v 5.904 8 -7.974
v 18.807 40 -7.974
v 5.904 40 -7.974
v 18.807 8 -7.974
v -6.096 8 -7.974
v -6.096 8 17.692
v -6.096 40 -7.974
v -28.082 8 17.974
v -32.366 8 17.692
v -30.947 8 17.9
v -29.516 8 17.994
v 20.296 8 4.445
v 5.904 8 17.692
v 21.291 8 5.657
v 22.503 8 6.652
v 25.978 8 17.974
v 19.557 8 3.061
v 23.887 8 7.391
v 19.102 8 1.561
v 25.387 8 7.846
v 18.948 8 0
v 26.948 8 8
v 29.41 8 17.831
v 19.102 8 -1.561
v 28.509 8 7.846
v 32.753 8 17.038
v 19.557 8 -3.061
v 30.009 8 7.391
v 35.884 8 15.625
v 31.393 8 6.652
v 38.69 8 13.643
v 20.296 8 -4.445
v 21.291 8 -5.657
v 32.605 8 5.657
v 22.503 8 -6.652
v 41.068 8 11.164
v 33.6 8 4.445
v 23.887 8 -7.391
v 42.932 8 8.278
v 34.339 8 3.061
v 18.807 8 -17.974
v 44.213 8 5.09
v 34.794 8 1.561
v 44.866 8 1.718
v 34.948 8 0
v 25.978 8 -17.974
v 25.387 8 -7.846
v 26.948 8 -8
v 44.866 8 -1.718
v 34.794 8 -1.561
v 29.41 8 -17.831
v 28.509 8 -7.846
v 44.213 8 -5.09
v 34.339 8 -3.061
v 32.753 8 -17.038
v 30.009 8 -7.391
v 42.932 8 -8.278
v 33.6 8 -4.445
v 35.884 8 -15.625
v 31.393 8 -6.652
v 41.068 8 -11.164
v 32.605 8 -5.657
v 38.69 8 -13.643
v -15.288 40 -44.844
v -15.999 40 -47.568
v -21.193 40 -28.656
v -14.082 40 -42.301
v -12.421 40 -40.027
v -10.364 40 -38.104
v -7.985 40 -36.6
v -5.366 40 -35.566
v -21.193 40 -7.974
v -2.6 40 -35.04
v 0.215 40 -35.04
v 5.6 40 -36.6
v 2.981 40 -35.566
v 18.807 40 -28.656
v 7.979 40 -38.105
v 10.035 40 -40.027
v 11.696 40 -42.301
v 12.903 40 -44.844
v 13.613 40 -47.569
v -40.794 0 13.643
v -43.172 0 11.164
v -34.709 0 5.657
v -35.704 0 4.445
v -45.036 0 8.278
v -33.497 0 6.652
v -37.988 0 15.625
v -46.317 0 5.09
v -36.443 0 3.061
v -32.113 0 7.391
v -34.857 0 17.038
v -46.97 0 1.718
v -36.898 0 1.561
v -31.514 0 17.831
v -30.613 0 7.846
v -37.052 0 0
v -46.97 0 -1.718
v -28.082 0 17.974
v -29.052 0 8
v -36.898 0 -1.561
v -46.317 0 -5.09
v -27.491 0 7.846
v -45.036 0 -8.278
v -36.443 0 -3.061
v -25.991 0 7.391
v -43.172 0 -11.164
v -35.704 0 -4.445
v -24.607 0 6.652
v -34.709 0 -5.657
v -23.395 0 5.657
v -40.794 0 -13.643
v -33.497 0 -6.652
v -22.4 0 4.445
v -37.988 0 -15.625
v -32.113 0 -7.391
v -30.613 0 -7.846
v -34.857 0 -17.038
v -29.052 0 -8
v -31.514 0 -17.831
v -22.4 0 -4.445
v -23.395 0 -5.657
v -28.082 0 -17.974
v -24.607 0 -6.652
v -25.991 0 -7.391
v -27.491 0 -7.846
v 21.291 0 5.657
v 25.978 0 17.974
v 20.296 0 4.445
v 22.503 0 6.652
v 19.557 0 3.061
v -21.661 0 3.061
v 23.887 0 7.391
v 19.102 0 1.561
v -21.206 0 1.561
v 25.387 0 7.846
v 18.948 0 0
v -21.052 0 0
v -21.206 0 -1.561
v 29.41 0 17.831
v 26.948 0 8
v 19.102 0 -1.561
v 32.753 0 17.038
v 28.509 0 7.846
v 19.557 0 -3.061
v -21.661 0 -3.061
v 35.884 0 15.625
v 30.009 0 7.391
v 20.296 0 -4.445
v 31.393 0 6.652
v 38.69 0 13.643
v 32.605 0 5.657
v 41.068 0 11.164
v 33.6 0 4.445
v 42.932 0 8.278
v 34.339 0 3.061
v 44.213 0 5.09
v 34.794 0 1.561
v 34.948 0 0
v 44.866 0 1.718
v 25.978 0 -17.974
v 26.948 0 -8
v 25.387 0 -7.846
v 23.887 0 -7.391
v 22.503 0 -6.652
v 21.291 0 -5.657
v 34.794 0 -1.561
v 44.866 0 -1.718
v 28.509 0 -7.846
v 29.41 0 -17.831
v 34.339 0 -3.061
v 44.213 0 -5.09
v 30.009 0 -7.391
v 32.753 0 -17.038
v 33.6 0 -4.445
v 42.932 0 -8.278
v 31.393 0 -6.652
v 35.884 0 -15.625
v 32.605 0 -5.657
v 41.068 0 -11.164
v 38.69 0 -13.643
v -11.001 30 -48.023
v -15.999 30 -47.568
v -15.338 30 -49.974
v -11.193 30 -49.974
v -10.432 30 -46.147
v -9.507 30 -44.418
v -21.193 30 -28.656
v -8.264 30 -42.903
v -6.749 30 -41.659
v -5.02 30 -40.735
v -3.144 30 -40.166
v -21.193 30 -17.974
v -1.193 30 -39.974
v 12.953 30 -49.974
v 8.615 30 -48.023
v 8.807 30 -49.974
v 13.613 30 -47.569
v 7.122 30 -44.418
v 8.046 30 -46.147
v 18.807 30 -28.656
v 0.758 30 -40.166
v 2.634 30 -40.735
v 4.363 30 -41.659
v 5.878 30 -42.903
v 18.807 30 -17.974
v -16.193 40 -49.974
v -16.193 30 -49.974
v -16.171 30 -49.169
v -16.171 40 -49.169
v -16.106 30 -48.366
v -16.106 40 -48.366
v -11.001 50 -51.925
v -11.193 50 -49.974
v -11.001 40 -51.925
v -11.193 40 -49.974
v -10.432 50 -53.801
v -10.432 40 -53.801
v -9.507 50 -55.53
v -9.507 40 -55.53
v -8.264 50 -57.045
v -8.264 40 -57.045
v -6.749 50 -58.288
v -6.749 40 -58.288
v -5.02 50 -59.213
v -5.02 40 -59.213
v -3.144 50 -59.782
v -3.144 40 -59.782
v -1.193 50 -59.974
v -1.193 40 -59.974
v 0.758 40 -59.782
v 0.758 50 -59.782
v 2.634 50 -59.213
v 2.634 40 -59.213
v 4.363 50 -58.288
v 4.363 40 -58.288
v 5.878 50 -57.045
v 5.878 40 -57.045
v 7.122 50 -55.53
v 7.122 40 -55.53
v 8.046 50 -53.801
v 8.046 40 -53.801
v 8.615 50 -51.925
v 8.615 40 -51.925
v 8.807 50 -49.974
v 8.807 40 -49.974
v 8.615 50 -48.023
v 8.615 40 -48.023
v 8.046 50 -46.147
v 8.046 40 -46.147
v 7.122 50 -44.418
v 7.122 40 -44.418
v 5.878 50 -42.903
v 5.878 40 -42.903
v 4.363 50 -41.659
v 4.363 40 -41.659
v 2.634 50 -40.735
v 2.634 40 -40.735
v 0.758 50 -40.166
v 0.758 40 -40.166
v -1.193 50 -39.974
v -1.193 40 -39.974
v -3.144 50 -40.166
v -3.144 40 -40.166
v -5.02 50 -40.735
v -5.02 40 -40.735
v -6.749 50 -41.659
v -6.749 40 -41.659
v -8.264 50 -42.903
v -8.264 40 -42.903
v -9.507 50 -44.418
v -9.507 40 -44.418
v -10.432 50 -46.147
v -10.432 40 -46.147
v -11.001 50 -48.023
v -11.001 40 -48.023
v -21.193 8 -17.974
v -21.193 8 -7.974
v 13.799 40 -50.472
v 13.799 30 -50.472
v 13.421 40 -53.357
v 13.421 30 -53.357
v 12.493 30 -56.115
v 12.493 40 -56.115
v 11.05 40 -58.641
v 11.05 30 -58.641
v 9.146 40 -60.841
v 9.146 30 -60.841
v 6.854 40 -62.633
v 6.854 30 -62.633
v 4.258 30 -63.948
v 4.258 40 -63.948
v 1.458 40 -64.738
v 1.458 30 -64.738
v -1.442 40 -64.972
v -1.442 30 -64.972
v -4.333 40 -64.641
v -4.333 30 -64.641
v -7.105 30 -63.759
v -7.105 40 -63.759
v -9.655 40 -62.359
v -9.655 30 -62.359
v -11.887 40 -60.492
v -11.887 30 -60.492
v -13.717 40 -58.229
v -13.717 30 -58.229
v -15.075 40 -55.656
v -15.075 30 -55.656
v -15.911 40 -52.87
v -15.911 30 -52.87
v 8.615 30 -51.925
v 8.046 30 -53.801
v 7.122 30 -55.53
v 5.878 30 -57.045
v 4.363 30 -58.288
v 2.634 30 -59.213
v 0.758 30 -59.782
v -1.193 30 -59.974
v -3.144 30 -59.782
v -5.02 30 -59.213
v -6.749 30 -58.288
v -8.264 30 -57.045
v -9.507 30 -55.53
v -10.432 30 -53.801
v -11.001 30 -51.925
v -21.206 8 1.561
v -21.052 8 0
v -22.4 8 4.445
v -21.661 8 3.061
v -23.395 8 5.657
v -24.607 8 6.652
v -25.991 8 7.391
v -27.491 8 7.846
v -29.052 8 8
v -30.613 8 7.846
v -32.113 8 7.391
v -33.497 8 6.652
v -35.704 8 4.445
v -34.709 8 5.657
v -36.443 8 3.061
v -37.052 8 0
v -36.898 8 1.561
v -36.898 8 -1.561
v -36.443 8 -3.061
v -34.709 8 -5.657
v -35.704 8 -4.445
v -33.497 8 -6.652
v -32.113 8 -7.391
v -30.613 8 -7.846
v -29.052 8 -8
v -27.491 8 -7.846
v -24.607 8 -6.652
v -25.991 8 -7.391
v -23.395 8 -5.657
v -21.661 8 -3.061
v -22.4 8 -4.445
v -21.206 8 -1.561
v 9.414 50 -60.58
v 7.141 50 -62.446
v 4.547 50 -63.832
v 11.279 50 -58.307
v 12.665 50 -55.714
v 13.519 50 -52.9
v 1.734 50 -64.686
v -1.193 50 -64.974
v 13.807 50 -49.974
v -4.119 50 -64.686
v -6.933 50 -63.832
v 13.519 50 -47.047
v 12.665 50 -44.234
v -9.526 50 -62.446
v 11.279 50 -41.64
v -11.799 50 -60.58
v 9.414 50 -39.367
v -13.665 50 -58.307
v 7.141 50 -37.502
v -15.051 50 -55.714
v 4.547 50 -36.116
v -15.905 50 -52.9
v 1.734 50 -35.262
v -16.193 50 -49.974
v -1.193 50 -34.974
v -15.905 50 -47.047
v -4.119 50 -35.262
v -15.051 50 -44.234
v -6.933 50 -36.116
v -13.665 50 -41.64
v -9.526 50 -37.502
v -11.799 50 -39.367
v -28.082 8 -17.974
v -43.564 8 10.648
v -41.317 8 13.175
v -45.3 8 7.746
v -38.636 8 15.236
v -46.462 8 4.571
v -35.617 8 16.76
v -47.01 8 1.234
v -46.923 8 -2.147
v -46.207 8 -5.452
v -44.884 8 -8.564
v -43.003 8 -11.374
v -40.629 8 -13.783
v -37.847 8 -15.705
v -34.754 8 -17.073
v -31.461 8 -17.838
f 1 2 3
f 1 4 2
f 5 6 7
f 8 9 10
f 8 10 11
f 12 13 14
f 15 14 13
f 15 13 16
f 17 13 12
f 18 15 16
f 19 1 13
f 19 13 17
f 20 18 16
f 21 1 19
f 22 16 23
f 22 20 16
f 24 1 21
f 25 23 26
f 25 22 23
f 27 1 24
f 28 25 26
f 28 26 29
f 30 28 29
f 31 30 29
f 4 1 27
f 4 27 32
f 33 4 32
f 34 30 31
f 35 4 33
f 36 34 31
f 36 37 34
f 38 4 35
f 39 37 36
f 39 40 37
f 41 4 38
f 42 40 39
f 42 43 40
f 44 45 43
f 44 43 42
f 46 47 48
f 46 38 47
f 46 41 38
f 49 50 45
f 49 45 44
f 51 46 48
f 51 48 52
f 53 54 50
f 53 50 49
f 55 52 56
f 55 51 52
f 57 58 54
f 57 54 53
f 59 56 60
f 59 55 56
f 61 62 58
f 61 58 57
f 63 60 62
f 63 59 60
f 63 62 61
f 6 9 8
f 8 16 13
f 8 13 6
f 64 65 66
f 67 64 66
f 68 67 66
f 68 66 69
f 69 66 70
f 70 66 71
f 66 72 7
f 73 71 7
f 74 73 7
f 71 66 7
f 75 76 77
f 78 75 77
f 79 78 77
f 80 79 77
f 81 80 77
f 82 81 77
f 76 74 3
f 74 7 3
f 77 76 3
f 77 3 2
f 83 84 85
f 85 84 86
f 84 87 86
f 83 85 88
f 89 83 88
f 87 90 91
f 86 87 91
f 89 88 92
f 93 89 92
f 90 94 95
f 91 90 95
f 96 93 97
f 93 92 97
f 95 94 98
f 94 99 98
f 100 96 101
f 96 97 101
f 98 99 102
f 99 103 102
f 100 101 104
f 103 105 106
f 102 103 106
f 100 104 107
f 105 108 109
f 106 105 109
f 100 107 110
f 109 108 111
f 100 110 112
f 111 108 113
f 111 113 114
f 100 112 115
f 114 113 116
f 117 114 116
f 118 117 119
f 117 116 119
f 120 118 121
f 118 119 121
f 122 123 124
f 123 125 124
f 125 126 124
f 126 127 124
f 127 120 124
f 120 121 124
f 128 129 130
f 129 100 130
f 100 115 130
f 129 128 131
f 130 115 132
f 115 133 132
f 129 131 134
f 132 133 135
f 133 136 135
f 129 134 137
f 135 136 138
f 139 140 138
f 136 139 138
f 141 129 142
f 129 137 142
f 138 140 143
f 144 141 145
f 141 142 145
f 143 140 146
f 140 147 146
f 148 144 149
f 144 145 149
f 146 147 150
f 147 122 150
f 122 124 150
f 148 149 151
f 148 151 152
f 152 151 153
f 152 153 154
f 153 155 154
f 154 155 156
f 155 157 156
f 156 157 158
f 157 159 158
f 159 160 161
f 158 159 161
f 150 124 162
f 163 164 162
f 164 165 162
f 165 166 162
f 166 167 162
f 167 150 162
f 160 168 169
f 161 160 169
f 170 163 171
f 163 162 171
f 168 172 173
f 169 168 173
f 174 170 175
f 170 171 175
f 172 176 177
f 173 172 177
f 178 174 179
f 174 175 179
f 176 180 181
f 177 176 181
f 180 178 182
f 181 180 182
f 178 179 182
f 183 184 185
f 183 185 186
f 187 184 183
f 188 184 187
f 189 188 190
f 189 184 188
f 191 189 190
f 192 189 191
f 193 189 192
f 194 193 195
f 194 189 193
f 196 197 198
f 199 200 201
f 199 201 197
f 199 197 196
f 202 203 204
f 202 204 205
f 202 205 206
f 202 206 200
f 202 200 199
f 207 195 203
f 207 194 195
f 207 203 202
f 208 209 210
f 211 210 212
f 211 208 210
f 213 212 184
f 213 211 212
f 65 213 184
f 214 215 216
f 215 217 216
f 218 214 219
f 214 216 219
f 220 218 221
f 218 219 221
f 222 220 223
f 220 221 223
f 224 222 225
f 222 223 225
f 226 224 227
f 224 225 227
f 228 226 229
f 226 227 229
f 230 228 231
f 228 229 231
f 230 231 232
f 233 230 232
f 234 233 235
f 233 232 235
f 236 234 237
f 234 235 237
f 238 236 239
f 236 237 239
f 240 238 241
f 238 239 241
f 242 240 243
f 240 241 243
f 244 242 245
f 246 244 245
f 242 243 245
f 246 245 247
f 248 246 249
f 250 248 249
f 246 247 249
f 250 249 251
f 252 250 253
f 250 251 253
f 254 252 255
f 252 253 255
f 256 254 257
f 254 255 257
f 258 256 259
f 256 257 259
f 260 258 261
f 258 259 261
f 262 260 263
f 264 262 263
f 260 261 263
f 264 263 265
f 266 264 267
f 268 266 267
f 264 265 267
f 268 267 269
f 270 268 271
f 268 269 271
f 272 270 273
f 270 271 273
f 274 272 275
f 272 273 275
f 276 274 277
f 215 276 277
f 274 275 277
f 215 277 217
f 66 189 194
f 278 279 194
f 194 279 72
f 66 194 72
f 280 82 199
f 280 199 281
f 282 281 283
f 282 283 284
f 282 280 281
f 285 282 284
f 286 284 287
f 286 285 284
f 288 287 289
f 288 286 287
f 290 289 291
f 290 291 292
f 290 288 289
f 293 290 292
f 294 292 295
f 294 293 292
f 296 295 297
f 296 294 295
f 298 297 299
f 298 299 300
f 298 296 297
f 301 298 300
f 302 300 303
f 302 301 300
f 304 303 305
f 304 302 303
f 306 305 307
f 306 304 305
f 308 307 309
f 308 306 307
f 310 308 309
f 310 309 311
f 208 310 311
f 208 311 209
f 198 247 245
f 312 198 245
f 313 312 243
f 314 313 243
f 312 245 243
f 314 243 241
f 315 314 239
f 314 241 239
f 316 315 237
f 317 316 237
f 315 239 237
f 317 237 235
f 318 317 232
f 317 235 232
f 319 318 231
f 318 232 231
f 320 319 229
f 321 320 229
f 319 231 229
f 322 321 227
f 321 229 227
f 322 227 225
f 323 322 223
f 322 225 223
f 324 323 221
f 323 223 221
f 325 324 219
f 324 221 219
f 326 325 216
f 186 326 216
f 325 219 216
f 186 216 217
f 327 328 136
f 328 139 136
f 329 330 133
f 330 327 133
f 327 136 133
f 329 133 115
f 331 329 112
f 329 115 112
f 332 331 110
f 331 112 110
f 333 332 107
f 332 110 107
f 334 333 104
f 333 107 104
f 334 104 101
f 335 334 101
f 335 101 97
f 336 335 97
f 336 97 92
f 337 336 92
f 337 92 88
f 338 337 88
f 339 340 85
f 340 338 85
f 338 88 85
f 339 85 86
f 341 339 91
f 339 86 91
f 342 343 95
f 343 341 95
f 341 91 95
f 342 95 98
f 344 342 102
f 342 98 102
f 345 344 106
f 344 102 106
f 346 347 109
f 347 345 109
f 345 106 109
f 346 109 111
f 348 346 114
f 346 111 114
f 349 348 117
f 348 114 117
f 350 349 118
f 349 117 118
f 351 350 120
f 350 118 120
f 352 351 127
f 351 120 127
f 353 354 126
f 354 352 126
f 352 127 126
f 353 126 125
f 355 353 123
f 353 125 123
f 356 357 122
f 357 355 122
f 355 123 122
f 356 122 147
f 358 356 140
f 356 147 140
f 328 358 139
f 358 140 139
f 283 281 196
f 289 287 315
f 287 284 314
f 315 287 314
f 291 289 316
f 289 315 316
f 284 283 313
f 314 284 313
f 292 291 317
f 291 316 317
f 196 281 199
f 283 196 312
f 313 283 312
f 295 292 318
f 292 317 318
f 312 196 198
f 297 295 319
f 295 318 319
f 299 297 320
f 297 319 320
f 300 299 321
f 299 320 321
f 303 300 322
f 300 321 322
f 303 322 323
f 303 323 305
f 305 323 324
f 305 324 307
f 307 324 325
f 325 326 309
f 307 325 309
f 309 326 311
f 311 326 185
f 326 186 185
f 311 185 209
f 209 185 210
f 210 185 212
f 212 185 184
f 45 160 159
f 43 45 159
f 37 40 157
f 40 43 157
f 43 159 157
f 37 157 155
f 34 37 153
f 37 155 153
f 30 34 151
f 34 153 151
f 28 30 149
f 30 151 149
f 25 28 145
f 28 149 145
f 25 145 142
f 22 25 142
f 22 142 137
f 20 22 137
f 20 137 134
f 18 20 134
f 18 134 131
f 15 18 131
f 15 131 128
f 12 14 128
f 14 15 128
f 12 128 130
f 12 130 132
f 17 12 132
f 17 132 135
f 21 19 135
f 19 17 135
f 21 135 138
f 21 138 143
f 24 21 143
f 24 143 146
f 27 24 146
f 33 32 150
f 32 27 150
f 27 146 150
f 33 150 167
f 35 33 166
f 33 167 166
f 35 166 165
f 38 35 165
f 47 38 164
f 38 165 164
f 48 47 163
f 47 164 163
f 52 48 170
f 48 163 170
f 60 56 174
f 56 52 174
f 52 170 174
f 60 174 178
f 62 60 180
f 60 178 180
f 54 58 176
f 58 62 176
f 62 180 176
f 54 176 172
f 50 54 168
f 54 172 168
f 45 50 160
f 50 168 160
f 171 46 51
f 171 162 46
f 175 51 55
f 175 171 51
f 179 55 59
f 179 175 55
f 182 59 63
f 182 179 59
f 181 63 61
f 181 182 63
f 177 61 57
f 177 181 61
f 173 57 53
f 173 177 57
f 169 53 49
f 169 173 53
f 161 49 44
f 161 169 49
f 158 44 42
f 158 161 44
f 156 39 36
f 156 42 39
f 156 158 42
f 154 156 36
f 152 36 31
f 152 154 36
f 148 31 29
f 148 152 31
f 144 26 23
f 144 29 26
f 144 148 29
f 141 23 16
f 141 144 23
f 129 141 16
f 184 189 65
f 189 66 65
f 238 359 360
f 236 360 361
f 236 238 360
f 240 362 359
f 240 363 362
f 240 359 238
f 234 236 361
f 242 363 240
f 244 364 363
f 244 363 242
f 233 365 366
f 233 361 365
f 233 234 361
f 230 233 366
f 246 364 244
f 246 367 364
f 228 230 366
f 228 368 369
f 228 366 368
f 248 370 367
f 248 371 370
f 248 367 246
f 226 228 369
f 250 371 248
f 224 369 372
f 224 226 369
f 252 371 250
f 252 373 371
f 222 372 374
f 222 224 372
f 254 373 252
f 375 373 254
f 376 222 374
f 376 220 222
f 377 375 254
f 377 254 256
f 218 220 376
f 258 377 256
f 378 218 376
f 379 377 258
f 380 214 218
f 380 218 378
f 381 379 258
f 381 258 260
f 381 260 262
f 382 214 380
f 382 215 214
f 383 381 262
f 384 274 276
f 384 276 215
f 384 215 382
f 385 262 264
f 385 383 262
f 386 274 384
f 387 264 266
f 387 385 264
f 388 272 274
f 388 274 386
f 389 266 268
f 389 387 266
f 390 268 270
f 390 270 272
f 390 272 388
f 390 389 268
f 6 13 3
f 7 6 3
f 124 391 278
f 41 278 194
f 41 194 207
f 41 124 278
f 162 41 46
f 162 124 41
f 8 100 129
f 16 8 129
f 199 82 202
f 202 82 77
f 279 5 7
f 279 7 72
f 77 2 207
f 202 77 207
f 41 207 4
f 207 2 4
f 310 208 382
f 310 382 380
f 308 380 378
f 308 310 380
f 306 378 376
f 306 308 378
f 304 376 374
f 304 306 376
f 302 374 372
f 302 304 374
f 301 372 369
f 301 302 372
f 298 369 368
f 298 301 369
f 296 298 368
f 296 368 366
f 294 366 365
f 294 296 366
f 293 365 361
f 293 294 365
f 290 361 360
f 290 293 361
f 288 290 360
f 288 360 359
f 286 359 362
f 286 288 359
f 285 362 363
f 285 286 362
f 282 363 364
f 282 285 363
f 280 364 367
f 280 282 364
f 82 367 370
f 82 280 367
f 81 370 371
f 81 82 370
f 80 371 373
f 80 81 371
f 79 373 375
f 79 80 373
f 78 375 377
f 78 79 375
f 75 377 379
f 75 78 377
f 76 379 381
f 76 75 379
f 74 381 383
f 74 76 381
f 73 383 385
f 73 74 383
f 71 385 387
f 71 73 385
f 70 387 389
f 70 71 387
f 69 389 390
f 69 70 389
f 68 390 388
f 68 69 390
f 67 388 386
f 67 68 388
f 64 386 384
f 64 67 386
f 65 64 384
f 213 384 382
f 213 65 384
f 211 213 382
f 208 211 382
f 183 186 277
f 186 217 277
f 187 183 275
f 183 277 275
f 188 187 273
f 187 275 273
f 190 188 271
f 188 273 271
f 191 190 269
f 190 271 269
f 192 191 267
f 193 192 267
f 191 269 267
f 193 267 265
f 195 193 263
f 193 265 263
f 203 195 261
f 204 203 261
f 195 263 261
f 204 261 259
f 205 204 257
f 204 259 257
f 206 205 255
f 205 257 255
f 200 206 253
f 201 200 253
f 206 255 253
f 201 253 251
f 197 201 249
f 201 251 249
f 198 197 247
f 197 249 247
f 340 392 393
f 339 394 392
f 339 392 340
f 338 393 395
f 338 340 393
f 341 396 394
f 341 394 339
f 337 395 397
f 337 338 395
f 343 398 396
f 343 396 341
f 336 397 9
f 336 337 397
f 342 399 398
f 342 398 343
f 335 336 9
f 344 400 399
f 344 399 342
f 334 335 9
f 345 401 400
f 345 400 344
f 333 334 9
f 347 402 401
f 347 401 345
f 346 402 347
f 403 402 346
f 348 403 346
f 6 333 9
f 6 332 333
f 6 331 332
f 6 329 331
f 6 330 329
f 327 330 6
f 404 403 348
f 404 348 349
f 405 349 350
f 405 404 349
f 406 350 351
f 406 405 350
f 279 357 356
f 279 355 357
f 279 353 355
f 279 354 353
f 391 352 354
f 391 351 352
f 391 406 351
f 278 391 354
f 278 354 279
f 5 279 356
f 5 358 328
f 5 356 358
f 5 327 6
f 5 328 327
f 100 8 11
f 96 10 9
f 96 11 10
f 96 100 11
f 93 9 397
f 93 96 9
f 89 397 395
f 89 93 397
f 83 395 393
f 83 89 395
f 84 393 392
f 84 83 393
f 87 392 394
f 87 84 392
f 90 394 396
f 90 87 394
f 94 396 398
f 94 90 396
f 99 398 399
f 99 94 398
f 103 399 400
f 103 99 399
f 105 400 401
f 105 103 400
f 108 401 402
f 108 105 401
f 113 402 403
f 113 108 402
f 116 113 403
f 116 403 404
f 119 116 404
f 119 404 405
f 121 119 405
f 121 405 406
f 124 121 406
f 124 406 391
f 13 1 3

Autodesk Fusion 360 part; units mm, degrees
sketch "Sketch1" plane through (0, 0, 0) normal (0, 1, 0) x (1, 0, 0)
  circle A0 centre (-29.052, 0) radius 8
  circle A1 centre (26.948, 0) radius 8
  line L0 (-29, -17.9738) -> (27, -17.9738)
  line L1 (-29, 17.9738) -> (27, 17.9738)
  arc A2 (25.9777, -17.9738) -> (25.9777, 17.9738) centre (26.948, 0) ccw
  arc A3 (-28.0816, 17.9738) -> (-28.0816, -17.9738) centre (-29.052, 0) ccw
  dimension "d1" = 56
  dimension "d2" = 16
  dimension "d3" = 16
  dimension "d5" = 36
  dimension "d6" = 36
extrude "Extrude1" add sketch "Sketch1" along normal blind 8
sketch "Sketch2" plane through (0, 8, 0) normal (0, 1, 0) x (-1, 0, 0)
  circle A0 centre (-26.948, 0) radius 8
  circle A1 centre (29.052, 0) radius 8
  arc A2 (28.0816, -17.9738) -> (28.0816, 17.9738) centre (29.052, 0) ccw
  line L0 (28.0816, 17.9738) -> (-25.9777, 17.9738)
  arc A3 (-25.9777, 17.9738) -> (-25.9777, -17.9738) centre (-26.948, 0) ccw
  line L1 (-25.9777, -17.9738) -> (28.0816, -17.9738)
  line L2 (21.1928, -17.9738) -> (-18.8072, -17.9738)
  line L3 (-18.8072, -17.9738) -> (-18.8072, -7.9738)
  line L4 (-18.8072, -7.9738) -> (21.1928, -7.9738)
  line L5 (21.1928, -7.9738) -> (21.1928, -17.9738)
  dimension "d9" = 40
  dimension "d10" = 10
  dimension "d11" = 40
  dimension "d12" = 40
  dimension "d13" = 10
extrude "Extrude2" add sketch "Sketch2" along normal blind 32 contours L1 L2 L3 L4 L5
sketch "Sketch3" plane through (0, 0, -17.9738) normal (0, 0, -1) x (-1, 0, 0)
  line L0 (-25.9777, 0) -> (28.0816, 0)
  line L1 (28.0816, 0) -> (28.0816, 8)
  line L2 (28.0816, 8) -> (21.1928, 8)
  line L3 (21.1928, 8) -> (21.1928, 40)
  line L4 (21.1928, 40) -> (-18.8072, 40)
  line L5 (-18.8072, 40) -> (-18.8072, 8)
  line L6 (-18.8072, 8) -> (-25.9777, 8)
  line L7 (-25.9777, 8) -> (-25.9777, 0)
  line L8 (-18.8072, 40) -> (21.1928, 40)
  line L9 (21.1928, 40) -> (21.1928, 30)
  line L10 (21.1928, 30) -> (-18.8072, 30)
  line L11 (-18.8072, 30) -> (-18.8072, 40)
  dimension "d16" = 10
extrude "Extrude3" add sketch "Sketch3" along normal blind 32 contours L3 L4 L5 L8 L9 L10 L11
sketch "Sketch4" plane through (0, 40, 0) normal (0, 1, 0) x (-1, 0, 0)
  line L0 (21.1928, -7.9738) -> (-18.8072, -7.9738)
  line L1 (-18.8072, -7.9738) -> (-18.8072, -49.9738)
  line L2 (-18.8072, -49.9738) -> (21.1928, -49.9738)
  line L3 (21.1928, -49.9738) -> (21.1928, -7.9738)
  line L4 (21.1928, -28.6563) -> (15.1408, -50.6921)
  line L5 (-19.0097, -28.6563) -> (-12.9578, -50.6921)
extrude "Extrude4" cut sketch "Sketch4" against normal blind 20 contours L2 L3 L4
sketch "Sketch5" plane through (0, 40, 0) normal (0, 1, 0) x (-1, 0, 0)
  line L0 (15.3381, -49.9738) -> (21.1928, -28.6563)
  line L1 (21.1928, -28.6563) -> (21.1928, -7.9738)
  line L2 (21.1928, -7.9738) -> (-18.8072, -7.9738)
  line L3 (-18.8072, -7.9738) -> (-18.8072, -49.9738)
  line L4 (-18.8072, -49.9738) -> (15.3381, -49.9738)
  line L5 (1.1928, 40.1018) -> (1.1928, -51.5866)
  line L6 (-12.9526, -49.9738) -> (-18.8072, -28.6563)
extrude "Extrude5" cut sketch "Sketch5" against normal blind 30 contours L3 L4 L6
sketch "Sketch6" plane through (0, 40, 0) normal (0, 1, 0) x (-1, 0, 0)
  line L0 (-18.8072, -28.6563) -> (-12.9526, -49.9738)
  line L1 (-12.9526, -49.9738) -> (15.3381, -49.9738)
  line L2 (15.3381, -49.9738) -> (21.1928, -28.6563)
  line L3 (21.1928, -28.6563) -> (21.1928, -7.9738)
  line L4 (21.1928, -7.9738) -> (-18.8072, -7.9738)
  line L5 (-18.8072, -7.9738) -> (-18.8072, -28.6563)
  circle A0 centre (1.1928, -49.9738) radius 15
  circle A1 centre (1.1928, -49.9738) radius 10
  dimension "d23" = 30
  dimension "d24" = 20
extrude "Extrude6" add sketch "Sketch6" along normal blind 10 contours L0 L1 L2 A0 A1 | L0 L1 L2 A0 A1
extrude "Extrude7" add 1 faces at (1.7657, 40, -62.9484) along direction (0, -1, 0) blind 10
extrude "Extrude8" cut 1 faces at (-2.0826, 40, -45.7415) along direction (0, -1, 0) blind 45
sketch "Sketch7" plane through (0, 8, 0) normal (0, 1, 0) x (-1, 0, 0)
  line L0 (-18.8072, -17.9738) -> (-18.8072, -7.9738)
  line L1 (-18.8072, -7.9738) -> (21.1928, -7.9738)
  line L2 (21.1928, -7.9738) -> (21.1928, -17.9738)
  line L3 (21.1928, -17.9738) -> (28.0816, -17.9738)
  arc A0 (28.0816, -17.9738) -> (28.0816, 17.9738) centre (29.052, 0) ccw
  line L4 (28.0816, 17.9738) -> (-25.9777, 17.9738)
  arc A1 (-25.9777, 17.9738) -> (-25.9777, -17.9738) centre (-26.948, 0) ccw
  line L5 (-25.9777, -17.9738) -> (-18.8072, -17.9738)
  circle A2 centre (29.052, 0) radius 8
  circle A3 centre (-26.948, 0) radius 8
  line L6 (6.0956, -7.9738) -> (-5.9044, -7.9738)
  line L7 (-5.9044, -7.9738) -> (-5.9044, 17.6922)
  line L8 (-5.9044, 17.6922) -> (6.0956, 17.6922)
  line L9 (6.0956, 17.6922) -> (6.0956, -7.9738)
  dimension "d31" = 12
extrude "Extrude9" add sketch "Sketch7" along normal blind 32 contours L1 L6 L7 L8 L9
sketch "Sketch8" plane through (5.9044, 0, 0) normal (1, 0, 0) x (0, 0, -1)
  line L0 (-17.6922, 8) -> (7.9738, 8)
  line L1 (7.9738, 8) -> (7.9738, 40)
  line L2 (7.9738, 40) -> (-17.6922, 40)
  line L3 (-17.6922, 40) -> (-17.6922, 8)
  line L4 (-17.6922, 8) -> (7.9738, 40)
extrude "Extrude10" cut sketch "Sketch8" against normal blind 55 contours L2 L3 L4
